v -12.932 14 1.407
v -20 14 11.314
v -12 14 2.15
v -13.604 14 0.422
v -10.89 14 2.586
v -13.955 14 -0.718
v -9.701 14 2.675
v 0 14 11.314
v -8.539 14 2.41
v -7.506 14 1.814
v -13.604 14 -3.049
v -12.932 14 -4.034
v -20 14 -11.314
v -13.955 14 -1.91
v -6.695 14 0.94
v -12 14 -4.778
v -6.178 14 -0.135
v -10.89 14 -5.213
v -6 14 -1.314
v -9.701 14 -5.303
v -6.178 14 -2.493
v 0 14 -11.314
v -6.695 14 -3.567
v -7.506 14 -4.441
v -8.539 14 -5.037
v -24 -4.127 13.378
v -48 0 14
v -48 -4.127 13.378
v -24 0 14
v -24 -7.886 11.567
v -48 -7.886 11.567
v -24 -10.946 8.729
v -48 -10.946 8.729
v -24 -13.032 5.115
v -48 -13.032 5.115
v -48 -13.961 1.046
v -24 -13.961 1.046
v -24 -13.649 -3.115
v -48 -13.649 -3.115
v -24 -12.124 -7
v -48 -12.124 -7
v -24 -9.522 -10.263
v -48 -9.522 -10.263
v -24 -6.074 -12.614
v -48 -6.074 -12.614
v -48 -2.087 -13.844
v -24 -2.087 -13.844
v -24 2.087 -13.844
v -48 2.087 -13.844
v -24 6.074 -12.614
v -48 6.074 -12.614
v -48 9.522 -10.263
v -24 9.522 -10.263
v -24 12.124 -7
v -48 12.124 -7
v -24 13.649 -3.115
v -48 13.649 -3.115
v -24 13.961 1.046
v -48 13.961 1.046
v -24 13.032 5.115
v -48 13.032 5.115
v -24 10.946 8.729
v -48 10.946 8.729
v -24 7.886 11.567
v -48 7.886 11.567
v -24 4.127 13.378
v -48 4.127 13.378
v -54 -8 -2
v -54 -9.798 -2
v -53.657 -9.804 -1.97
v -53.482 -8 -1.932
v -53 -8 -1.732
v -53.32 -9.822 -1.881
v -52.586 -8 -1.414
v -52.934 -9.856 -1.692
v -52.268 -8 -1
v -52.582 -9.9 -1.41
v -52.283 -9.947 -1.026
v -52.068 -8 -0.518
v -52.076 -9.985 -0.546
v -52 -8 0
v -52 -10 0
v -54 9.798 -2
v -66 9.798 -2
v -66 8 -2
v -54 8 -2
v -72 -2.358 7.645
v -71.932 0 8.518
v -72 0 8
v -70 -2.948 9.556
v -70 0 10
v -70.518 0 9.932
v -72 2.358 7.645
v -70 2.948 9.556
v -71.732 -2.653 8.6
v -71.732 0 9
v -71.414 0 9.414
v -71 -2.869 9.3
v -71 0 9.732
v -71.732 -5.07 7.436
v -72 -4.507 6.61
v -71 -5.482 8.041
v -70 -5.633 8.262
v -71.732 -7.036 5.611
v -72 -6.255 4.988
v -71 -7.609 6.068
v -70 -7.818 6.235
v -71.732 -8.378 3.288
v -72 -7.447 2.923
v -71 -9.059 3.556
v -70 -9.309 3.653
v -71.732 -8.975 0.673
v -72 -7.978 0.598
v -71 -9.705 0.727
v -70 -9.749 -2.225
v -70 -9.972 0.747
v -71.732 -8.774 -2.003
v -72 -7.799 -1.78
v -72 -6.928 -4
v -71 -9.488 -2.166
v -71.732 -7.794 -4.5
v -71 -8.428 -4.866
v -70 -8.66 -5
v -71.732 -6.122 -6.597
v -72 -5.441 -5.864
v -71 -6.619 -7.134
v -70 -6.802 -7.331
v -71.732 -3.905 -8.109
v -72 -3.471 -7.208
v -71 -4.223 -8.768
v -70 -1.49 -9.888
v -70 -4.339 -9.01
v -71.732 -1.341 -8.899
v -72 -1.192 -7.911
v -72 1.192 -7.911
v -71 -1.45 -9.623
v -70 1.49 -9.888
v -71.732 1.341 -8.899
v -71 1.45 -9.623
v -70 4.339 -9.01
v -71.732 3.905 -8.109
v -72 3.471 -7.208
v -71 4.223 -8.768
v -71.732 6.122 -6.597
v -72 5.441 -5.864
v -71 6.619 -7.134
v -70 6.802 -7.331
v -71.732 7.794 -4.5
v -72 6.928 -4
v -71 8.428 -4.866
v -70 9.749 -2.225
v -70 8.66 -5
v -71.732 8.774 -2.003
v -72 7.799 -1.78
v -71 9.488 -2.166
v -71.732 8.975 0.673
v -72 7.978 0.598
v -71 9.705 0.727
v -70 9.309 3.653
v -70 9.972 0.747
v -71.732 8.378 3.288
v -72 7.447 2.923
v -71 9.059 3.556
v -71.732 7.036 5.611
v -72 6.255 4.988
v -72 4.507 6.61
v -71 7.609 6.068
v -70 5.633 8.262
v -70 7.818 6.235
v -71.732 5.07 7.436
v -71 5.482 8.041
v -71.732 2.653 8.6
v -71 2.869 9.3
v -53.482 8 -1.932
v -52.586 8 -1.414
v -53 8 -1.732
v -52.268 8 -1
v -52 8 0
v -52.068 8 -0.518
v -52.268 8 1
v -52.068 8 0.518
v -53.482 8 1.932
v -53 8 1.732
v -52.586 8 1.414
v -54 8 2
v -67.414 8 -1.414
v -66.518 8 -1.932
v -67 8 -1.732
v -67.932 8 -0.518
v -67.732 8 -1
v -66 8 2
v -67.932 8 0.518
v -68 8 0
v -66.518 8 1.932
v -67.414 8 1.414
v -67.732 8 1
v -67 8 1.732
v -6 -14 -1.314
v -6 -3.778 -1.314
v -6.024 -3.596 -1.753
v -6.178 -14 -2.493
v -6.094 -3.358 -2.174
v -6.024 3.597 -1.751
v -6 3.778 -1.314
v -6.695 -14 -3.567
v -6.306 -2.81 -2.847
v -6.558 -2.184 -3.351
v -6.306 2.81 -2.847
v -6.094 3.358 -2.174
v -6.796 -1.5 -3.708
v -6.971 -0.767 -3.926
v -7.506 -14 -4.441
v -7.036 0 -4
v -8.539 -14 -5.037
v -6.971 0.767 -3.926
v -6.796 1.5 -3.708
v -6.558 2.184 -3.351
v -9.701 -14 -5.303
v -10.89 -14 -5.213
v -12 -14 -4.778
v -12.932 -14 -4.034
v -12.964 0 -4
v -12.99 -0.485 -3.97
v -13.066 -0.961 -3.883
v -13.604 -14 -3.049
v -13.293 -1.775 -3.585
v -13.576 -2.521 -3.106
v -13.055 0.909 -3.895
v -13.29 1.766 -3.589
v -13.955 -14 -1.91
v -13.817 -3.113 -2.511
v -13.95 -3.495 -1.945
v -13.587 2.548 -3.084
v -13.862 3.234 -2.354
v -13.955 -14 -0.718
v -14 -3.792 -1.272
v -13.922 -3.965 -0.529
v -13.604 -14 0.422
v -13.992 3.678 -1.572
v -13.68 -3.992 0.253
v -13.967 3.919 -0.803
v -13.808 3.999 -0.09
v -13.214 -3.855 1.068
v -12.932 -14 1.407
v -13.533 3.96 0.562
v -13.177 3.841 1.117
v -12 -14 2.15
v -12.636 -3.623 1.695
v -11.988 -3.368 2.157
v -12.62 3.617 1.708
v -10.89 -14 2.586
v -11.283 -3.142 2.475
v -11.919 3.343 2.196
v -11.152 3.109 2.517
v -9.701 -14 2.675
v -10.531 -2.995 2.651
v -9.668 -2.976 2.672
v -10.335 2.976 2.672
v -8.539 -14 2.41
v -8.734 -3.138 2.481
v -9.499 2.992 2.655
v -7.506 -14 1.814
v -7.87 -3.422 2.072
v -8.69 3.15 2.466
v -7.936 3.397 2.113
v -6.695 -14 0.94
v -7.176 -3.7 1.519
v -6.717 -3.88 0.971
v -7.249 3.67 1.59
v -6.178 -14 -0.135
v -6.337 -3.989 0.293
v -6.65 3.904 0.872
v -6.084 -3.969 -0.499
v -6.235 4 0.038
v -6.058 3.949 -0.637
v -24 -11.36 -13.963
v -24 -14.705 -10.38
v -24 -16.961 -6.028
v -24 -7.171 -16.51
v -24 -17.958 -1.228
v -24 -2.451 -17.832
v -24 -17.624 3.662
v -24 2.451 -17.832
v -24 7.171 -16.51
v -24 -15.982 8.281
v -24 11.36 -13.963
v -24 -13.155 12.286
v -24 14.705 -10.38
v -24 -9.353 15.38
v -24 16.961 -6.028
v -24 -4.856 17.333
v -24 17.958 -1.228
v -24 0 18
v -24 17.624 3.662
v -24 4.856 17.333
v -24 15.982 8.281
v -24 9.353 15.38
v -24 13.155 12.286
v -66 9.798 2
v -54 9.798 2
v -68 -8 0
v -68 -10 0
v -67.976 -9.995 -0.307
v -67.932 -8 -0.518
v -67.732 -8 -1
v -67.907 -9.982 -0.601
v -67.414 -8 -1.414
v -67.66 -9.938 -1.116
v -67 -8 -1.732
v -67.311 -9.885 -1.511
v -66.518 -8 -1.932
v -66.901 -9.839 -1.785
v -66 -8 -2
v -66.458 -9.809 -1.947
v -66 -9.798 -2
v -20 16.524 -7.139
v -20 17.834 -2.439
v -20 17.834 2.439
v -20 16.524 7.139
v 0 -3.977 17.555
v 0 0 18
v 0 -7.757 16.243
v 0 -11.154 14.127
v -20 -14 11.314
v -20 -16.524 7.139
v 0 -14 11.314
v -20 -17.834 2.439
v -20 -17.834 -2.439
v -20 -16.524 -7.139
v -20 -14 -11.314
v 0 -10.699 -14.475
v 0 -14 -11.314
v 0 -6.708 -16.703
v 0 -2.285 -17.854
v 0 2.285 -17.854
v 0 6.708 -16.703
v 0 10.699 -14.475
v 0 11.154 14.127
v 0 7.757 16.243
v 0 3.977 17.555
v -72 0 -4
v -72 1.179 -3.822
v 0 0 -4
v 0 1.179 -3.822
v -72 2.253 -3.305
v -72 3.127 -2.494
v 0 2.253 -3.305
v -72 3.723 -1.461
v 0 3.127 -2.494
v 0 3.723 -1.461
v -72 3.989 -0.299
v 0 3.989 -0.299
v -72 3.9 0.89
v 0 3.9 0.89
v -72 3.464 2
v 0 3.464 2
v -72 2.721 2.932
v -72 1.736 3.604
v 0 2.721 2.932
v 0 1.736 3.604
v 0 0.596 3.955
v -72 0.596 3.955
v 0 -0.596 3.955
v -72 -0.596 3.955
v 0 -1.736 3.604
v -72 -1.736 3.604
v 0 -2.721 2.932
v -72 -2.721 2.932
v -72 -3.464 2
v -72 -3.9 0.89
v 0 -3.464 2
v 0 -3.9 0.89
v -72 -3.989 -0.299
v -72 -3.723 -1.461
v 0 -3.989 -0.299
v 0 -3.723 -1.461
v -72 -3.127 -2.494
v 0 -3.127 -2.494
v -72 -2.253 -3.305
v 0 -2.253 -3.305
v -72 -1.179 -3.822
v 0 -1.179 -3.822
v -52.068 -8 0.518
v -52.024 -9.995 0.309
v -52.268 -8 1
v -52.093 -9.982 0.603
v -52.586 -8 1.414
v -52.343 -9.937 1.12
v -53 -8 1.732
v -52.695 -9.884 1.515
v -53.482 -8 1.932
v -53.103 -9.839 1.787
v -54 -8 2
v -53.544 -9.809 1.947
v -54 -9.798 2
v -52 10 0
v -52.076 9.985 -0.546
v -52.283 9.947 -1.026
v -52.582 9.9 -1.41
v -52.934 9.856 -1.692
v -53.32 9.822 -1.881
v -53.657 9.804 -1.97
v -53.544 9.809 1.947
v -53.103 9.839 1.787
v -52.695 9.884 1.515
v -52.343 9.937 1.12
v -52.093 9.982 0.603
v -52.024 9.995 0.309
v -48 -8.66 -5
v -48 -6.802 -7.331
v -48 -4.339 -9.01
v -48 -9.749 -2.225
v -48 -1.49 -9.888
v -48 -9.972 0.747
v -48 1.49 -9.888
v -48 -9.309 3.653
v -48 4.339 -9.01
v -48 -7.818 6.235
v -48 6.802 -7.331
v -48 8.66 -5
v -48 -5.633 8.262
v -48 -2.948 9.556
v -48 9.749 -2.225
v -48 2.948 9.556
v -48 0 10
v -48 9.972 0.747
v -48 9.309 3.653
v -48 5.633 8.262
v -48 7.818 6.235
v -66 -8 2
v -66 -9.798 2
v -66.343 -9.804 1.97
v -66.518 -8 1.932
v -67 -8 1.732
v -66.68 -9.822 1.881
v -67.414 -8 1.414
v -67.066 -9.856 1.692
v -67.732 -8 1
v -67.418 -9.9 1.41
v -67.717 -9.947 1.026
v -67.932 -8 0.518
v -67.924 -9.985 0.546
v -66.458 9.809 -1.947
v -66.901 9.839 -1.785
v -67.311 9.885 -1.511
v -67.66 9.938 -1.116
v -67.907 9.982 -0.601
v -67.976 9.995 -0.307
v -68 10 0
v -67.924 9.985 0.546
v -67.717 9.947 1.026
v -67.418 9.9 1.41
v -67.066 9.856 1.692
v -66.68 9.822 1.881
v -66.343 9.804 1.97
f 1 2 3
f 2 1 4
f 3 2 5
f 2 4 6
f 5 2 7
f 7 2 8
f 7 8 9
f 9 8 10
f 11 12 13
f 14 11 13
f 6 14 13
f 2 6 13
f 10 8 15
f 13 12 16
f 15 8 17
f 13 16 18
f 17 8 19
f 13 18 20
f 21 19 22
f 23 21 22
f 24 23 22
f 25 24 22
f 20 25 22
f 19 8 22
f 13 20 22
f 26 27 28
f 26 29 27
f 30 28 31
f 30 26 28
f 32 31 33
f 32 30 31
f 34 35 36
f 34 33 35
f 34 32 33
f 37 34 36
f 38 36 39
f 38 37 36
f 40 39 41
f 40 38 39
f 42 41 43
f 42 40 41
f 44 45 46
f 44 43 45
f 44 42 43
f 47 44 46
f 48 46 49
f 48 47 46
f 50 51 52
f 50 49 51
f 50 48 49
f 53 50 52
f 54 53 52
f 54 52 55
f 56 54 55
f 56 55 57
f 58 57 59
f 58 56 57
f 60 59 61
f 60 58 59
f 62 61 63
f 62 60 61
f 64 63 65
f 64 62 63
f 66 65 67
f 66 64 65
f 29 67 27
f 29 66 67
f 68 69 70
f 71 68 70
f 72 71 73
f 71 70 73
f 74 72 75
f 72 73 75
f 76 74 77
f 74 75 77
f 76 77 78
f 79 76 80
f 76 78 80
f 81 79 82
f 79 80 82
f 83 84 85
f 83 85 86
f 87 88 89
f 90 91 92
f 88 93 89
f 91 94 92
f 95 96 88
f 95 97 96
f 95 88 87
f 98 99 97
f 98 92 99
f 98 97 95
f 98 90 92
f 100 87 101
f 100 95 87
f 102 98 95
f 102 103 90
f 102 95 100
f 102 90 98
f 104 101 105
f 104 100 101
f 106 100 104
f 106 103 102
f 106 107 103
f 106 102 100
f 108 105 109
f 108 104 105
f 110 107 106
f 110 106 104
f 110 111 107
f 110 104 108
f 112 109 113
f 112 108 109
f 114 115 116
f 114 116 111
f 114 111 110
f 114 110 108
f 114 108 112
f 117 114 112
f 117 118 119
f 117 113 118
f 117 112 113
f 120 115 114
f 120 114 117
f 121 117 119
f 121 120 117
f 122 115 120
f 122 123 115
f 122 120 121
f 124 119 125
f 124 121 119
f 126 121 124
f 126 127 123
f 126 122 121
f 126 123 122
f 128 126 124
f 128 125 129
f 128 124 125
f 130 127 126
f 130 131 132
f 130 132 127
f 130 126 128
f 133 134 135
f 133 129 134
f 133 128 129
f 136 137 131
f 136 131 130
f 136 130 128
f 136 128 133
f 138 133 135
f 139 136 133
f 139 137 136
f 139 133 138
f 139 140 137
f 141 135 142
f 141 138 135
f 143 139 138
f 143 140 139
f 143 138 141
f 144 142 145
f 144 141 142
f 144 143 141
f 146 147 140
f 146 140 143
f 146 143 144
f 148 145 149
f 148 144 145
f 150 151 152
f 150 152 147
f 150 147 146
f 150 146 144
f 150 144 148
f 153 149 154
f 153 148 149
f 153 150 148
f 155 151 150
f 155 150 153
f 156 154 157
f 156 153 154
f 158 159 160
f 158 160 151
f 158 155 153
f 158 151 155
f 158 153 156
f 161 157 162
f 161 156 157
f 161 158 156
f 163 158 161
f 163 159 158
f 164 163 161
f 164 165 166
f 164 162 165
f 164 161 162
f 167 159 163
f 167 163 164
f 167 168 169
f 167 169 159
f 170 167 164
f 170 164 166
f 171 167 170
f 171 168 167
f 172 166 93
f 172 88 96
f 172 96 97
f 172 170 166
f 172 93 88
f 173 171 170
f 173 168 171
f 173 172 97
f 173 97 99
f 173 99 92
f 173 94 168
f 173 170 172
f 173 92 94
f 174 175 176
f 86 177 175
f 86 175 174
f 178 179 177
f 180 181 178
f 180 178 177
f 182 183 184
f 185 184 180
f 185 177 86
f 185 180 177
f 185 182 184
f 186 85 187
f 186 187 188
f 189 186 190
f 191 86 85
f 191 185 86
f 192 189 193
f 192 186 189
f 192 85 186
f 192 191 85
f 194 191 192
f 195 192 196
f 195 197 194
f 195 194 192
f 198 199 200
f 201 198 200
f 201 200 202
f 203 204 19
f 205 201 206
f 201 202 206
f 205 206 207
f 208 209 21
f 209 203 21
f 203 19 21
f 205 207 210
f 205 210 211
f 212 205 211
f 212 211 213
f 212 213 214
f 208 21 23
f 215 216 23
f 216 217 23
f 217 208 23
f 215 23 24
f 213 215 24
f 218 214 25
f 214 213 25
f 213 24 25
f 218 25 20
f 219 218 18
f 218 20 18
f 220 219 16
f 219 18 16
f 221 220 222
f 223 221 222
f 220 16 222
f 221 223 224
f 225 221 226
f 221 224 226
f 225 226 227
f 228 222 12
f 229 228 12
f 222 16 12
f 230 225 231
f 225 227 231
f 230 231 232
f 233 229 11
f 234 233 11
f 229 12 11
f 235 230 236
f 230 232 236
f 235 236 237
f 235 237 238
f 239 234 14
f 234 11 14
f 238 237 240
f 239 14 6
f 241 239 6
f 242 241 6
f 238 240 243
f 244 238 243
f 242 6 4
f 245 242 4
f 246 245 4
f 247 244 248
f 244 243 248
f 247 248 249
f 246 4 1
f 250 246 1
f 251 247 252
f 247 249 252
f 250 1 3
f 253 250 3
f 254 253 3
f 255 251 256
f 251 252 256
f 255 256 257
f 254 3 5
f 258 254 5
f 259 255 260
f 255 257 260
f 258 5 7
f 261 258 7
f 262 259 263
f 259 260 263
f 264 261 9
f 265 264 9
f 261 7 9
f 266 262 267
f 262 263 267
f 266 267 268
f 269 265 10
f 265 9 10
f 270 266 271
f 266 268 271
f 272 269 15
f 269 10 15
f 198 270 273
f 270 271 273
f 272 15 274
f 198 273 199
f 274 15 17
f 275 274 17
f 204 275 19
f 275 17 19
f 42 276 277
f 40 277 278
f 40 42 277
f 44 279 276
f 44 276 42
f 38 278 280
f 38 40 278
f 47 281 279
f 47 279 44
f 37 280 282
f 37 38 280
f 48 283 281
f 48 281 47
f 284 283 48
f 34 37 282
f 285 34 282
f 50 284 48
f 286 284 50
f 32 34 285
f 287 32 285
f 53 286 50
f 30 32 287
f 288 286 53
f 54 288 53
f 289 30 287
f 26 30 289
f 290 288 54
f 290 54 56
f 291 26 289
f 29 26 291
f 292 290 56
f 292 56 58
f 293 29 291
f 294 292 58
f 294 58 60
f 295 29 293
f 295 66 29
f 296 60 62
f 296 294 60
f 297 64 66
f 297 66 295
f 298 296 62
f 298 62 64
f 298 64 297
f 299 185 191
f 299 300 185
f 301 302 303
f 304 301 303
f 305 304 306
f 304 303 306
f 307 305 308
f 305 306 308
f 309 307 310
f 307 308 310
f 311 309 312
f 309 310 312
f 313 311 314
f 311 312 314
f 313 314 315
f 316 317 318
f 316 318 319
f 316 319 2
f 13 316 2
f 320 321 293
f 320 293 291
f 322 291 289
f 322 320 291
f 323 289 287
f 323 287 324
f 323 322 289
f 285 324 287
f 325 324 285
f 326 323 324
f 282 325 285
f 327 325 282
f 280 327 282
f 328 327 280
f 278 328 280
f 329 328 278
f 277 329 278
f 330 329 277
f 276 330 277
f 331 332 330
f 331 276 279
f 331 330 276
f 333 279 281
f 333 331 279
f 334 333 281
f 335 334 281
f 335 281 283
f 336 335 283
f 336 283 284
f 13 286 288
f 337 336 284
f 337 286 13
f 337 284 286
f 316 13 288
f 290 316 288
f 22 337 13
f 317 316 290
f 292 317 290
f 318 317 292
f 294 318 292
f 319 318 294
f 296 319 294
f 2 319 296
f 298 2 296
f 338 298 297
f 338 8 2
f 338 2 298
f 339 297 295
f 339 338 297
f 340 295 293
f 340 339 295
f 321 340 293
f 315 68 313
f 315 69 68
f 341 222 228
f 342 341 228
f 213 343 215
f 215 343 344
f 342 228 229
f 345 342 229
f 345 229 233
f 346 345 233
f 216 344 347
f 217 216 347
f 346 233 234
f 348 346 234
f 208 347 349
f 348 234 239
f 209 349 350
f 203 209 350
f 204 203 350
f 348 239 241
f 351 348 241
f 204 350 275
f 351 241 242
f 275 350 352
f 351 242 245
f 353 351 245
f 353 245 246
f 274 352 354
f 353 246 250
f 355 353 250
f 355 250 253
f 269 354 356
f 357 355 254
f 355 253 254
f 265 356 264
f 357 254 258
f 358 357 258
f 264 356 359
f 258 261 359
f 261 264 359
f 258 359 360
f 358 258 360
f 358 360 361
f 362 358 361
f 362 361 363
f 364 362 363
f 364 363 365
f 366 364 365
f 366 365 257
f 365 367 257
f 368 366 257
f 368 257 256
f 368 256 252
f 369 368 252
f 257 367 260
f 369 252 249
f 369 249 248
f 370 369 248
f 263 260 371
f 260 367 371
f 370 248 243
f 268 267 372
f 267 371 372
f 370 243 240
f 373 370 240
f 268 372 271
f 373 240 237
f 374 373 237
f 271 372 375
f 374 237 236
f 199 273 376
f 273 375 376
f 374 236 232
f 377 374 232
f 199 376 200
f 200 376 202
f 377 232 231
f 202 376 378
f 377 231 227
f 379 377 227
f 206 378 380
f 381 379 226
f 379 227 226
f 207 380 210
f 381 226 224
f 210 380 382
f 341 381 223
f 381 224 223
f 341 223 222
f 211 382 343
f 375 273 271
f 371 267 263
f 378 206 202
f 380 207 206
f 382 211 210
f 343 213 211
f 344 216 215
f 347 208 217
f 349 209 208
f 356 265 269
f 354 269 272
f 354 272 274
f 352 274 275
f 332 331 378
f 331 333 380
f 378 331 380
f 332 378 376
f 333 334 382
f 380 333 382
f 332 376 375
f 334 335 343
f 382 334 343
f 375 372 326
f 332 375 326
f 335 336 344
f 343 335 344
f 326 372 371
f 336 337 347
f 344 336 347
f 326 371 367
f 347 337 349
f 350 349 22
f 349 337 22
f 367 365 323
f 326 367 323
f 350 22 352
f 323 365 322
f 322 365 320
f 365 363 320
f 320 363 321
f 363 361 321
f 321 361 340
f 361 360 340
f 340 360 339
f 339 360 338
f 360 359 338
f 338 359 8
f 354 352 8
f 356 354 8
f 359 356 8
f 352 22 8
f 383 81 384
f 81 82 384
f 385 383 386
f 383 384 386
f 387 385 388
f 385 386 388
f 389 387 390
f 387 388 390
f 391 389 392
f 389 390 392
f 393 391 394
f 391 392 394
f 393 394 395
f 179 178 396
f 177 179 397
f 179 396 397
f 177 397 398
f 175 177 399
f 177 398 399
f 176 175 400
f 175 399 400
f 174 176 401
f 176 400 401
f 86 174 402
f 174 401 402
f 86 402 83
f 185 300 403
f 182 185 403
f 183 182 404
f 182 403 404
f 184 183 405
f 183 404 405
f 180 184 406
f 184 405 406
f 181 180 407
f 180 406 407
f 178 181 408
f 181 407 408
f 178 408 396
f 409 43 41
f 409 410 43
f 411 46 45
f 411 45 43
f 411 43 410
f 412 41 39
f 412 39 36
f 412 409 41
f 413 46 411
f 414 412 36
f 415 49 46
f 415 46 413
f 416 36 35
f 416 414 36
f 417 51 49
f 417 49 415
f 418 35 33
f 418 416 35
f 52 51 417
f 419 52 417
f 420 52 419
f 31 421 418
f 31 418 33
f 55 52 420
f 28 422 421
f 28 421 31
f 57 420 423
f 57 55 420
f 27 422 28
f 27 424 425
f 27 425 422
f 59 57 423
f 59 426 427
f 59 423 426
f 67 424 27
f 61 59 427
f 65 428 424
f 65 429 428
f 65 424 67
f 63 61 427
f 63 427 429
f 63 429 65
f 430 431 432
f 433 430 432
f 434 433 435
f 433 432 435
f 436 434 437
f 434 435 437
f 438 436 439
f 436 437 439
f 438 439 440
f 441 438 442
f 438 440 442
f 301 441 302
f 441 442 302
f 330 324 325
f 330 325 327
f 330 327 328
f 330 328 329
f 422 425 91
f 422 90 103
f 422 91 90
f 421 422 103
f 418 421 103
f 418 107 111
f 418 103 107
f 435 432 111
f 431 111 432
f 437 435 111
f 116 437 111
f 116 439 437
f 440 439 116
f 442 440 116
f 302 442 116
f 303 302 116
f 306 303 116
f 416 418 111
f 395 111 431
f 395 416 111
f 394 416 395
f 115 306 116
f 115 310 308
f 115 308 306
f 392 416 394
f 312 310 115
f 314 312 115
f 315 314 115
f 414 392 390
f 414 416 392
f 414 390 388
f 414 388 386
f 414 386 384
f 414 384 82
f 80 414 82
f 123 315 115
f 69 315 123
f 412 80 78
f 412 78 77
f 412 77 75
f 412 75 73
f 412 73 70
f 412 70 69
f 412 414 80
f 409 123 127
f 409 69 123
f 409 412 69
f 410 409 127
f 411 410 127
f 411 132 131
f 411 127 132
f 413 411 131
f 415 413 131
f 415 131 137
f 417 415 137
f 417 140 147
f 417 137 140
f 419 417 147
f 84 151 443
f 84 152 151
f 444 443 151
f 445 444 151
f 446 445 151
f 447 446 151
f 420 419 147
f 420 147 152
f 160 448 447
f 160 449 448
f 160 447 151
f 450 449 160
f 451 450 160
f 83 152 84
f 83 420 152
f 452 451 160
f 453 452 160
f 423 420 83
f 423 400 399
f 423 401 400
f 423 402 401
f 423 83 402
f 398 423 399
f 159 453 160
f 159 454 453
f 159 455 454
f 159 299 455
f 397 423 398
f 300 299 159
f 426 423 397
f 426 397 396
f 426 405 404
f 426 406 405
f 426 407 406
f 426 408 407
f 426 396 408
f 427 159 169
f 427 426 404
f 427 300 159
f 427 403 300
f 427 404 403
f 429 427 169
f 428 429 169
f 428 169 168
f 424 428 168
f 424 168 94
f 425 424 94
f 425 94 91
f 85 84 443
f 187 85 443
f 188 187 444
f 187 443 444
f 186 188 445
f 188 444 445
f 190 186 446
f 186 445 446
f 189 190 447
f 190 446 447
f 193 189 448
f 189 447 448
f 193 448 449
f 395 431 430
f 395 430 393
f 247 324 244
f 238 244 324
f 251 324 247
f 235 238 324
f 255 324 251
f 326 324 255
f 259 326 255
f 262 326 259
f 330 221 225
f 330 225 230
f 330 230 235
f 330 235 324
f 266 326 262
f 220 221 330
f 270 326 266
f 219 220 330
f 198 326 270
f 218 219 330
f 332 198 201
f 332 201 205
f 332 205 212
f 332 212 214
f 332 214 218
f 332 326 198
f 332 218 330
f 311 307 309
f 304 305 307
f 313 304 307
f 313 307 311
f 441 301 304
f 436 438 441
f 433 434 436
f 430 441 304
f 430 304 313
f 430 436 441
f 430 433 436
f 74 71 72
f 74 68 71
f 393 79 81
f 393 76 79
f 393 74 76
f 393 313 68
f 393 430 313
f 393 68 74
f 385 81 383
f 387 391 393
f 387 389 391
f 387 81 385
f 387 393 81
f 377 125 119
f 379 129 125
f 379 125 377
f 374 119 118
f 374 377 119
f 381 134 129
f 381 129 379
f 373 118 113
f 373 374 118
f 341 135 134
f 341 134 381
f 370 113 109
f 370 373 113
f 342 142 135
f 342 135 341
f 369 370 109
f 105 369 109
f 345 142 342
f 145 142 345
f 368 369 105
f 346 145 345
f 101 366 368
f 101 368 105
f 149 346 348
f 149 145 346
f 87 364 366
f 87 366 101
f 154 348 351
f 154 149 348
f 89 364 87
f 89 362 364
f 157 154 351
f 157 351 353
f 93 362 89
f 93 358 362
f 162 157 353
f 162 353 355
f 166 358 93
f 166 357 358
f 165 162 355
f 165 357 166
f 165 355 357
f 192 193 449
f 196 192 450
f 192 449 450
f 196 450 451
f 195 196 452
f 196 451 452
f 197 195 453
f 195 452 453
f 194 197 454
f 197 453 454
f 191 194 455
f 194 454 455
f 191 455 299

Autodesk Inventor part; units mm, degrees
ref_plane "YZ Plane" through (0, 0, 0) normal (1, 0, 0) x (0, 1, 0)
ref_plane "XY Plane" through (0, 0, 0) normal (0, 0, 1) x (1, 0, 0)
sketch "Boceto1" plane through (0, 0, 0) normal (0, 1, 0) x (-1, 0, 0)
  line L0 (0, 0) -> (72, 0)
  line L1 (72, 0) -> (72, 10)
  line L2 (72, 10) -> (48, 10)
  line L3 (48, 10) -> (48, 14)
  line L4 (48, 14) -> (24, 14)
  line L5 (24, 14) -> (24, 18)
  line L6 (24, 18) -> (0, 18)
  line L7 (0, 18) -> (0, 0)
  dimension "d15" = 72
  dimension "d16" = 10
  dimension "d17" = 24
  dimension "d18" = 4
  dimension "d19" = 24
  dimension "d20" = 4
revolve "Revolución2" add sketch "Boceto1" angle 360 about axis through (0, 0, 0) along (-1, 0, 0)
sketch "Boceto2" plane through (0, 0, 0) normal (1, 0, 0) x (0, 0, -1)
  line L0 (-11.3137, 14) -> (11.3137, 14)
  circle A0 centre (0, 0) radius 18 projected
  line L1 (-11.3137, -14) -> (11.3137, -14)
  dimension "d22" = 14
  dimension "d25" = 14
extrude "Extrusión1" cut sketch "Boceto2" against normal blind 20 contours A0 L0 | L1 A0
sketch "Boceto3" plane through (0, 14, 11.3137) normal (0, 1, 0) x (1, 0, 0)
  circle A0 centre (-10, 12.6274) radius 4
  line L0 (-20, 22.6274) -> (0, 22.6274) projected
  line L1 (0, 22.6274) -> (0, 0) projected
  point P0 (0, 11.3137)
  dimension "d26" = 8
  dimension "d28" = 10
  dimension "d29" = 10
extrude "Extrusión2" cut sketch "Boceto3" against normal through all
sketch "Boceto4" plane through (0, 0, 0) normal (1, 0, 0) x (0, 0, -1)
  circle A0 centre (0, 0) radius 4
  dimension "d32" = 8
extrude "Extrusión3" cut sketch "Boceto4" against normal through all
fillet "Empalme1" radius 2 1 edges at (-72, 0, -10)
ref_plane "Plano de trabajo1" through (0, 10, 0) normal (0, 1, 0) x (-1, 0, 0)
sketch "Boceto5" plane through (0, 10, 0) normal (0, 1, 0) x (-1, 0, 0)
  line L0 (54, 2) -> (66, 2)
  line L1 (68, 0) -> (68, 0)
  line L2 (66, -2) -> (54, -2)
  line L3 (52, 0) -> (52, 0)
  line L4 (52, 2) -> (68, -2) construction
  line L5 (68, 2) -> (52, -2) construction
  arc A0 (68, 0) -> (66, 2) centre (66, 0) ccw
  arc A1 (66, -2) -> (68, 0) centre (66, 0) ccw
  arc A2 (54, 2) -> (52, 0) centre (54, 0) ccw
  arc A3 (52, 0) -> (54, -2) centre (54, 0) ccw
  line L6 (48, -14) -> (48, 14) projected
  point P0 (0, 0)
  point P1 (60, 0)
  point P2 (52, 0)
  point P3 (68, 0)
  dimension "d37" = 16
  dimension "d38" = 4
  dimension "d39" = 2
  dimension "d40" = 12
extrude "Extrusión4" cut sketch "Boceto5" against normal blind 2
mirror "Simetría1" about plane through (0, 0, 0) normal (0, 1, 0) of "Extrusión4"
properties part number "Pieza de practica 11"
